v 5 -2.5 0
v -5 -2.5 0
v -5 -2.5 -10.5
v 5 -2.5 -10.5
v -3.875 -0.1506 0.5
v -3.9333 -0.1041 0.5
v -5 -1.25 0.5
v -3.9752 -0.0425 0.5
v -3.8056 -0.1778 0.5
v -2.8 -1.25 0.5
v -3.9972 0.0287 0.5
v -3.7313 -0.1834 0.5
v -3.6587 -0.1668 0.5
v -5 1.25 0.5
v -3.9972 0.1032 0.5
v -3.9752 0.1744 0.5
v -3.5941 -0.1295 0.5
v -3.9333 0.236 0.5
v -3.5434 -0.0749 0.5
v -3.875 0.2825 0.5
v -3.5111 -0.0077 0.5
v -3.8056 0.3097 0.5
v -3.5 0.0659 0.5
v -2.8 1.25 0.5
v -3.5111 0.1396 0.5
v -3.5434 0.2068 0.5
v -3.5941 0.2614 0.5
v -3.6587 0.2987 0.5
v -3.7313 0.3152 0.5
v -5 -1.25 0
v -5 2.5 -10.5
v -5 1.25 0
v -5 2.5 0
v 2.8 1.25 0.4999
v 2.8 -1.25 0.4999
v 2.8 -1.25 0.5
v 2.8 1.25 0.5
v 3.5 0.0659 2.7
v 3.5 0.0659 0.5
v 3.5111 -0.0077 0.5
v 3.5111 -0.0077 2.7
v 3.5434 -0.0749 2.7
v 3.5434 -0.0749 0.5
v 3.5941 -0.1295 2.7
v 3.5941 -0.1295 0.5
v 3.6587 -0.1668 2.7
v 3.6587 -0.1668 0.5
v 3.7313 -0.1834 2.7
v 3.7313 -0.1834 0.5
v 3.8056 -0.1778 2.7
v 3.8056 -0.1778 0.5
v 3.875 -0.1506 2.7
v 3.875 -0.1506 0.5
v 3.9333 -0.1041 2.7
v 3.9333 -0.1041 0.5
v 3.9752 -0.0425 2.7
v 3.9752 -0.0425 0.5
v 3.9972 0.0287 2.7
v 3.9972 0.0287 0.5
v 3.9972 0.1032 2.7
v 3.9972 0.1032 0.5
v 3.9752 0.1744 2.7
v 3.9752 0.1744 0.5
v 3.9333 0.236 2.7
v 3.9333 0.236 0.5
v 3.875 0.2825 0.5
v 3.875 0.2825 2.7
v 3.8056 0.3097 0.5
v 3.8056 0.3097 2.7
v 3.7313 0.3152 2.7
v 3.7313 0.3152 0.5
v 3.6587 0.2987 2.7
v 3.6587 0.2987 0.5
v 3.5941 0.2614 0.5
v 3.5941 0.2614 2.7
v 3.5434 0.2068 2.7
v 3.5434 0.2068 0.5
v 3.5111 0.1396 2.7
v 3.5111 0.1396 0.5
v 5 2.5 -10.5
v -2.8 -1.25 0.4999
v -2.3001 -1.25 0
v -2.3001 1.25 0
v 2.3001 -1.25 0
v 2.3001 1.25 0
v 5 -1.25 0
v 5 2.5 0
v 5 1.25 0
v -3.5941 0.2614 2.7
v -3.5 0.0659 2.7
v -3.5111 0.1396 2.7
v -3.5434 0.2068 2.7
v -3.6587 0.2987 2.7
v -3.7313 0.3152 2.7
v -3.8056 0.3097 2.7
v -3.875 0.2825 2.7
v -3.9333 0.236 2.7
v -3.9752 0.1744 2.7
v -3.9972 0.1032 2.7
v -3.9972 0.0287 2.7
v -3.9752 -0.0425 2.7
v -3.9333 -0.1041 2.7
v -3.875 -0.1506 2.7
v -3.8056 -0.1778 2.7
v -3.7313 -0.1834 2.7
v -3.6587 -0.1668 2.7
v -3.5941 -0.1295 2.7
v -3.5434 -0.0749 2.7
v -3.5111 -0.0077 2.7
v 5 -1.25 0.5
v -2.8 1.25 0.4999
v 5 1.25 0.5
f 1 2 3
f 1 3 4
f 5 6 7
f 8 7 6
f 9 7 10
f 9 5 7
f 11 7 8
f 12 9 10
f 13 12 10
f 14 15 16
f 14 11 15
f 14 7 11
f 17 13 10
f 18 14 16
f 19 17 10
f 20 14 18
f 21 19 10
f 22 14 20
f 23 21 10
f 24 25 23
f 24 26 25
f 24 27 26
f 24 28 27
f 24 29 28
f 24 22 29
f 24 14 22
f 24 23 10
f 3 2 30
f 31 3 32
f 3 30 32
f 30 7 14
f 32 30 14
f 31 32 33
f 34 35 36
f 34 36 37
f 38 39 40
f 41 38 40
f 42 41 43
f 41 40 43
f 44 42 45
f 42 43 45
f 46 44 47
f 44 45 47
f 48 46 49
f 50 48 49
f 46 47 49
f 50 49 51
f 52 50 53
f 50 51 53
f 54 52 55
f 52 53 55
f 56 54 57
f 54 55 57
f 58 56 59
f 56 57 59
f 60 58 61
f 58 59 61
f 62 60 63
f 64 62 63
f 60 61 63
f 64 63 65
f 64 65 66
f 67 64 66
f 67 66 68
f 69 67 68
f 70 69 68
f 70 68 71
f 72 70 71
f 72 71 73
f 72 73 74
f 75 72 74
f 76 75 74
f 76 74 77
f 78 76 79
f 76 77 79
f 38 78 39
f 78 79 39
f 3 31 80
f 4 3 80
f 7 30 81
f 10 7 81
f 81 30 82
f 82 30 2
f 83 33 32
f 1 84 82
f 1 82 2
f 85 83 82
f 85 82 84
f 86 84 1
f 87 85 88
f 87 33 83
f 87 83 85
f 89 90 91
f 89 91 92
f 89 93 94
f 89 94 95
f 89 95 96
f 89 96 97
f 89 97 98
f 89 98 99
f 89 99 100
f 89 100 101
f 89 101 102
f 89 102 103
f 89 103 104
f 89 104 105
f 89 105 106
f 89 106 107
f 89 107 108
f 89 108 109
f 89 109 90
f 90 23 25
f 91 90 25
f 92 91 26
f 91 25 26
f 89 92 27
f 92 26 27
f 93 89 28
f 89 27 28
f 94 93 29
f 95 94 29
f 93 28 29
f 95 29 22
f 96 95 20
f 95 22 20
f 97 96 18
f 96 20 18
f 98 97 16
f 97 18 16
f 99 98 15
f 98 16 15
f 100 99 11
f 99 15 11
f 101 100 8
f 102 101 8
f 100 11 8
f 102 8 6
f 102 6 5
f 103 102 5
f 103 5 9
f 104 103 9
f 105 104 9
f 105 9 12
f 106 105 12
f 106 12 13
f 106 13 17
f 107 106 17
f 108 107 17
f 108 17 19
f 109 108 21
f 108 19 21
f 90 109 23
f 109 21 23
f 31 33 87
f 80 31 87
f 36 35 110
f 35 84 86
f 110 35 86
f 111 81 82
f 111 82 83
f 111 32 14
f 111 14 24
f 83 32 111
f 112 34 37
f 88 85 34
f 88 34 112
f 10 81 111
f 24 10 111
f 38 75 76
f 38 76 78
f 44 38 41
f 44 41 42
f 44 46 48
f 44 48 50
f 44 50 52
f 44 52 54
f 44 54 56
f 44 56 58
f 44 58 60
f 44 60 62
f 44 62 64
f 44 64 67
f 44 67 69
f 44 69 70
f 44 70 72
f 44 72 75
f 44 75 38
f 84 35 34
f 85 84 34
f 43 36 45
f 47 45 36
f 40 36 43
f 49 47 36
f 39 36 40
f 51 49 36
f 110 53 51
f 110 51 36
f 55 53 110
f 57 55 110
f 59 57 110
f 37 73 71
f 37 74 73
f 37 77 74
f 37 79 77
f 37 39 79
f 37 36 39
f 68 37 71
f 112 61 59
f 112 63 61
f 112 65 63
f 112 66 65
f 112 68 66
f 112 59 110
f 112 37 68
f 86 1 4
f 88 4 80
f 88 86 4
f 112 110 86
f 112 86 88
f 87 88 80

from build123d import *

# Parameters (mm, degrees)
SKETCH1_W           = 10
SKETCH1_H           = 5
BOSS_EXTRUDE1_DEPTH = 10.5
SKETCH2_W           = 2.2
SKETCH2_H           = 2.5
BOSS_EXTRUDE2_DEPTH = 0.5
CHAMFER1_SIZE       = 0.5
SKETCH4_R           = 0.25
BOSS_EXTRUDE3_DEPTH = 2.2


with BuildPart() as part:
    # Sketch1 → Boss-Extrude1 (new body)
    with BuildSketch(Plane.XY):
        Rectangle(SKETCH1_W, SKETCH1_H)
    extrude(amount=-BOSS_EXTRUDE1_DEPTH)

    # Sketch2 → Boss-Extrude2 (add)
    with BuildSketch(Plane.XY):
        with Locations((-3.9, 0)):
            Rectangle(SKETCH2_W, SKETCH2_H)
        with Locations((3.9, 0)):
            Rectangle(SKETCH2_W, SKETCH2_H)
    extrude(amount=BOSS_EXTRUDE2_DEPTH)

    # Chamfer1
    chamfer1_edges = [part.edges().sort_by_distance(p)[0] for p in [
        (2.8, 0, 0),
        (-2.8, 0, 0),
    ]]
    chamfer(chamfer1_edges, length=CHAMFER1_SIZE - 0.0001)  # a hair under: the kernel refuses the full size

    # Sketch4 → Boss-Extrude3 (add)
    with BuildSketch(Plane.XY.offset(0.5)):
        with Locations((-3.75, 0.065947188)):
            Circle(SKETCH4_R)
        with Locations(Location((3.75, 0.065947188, 0), (0, 0, 180))):
            Circle(SKETCH4_R)
    extrude(amount=BOSS_EXTRUDE3_DEPTH)


solid = part.part
